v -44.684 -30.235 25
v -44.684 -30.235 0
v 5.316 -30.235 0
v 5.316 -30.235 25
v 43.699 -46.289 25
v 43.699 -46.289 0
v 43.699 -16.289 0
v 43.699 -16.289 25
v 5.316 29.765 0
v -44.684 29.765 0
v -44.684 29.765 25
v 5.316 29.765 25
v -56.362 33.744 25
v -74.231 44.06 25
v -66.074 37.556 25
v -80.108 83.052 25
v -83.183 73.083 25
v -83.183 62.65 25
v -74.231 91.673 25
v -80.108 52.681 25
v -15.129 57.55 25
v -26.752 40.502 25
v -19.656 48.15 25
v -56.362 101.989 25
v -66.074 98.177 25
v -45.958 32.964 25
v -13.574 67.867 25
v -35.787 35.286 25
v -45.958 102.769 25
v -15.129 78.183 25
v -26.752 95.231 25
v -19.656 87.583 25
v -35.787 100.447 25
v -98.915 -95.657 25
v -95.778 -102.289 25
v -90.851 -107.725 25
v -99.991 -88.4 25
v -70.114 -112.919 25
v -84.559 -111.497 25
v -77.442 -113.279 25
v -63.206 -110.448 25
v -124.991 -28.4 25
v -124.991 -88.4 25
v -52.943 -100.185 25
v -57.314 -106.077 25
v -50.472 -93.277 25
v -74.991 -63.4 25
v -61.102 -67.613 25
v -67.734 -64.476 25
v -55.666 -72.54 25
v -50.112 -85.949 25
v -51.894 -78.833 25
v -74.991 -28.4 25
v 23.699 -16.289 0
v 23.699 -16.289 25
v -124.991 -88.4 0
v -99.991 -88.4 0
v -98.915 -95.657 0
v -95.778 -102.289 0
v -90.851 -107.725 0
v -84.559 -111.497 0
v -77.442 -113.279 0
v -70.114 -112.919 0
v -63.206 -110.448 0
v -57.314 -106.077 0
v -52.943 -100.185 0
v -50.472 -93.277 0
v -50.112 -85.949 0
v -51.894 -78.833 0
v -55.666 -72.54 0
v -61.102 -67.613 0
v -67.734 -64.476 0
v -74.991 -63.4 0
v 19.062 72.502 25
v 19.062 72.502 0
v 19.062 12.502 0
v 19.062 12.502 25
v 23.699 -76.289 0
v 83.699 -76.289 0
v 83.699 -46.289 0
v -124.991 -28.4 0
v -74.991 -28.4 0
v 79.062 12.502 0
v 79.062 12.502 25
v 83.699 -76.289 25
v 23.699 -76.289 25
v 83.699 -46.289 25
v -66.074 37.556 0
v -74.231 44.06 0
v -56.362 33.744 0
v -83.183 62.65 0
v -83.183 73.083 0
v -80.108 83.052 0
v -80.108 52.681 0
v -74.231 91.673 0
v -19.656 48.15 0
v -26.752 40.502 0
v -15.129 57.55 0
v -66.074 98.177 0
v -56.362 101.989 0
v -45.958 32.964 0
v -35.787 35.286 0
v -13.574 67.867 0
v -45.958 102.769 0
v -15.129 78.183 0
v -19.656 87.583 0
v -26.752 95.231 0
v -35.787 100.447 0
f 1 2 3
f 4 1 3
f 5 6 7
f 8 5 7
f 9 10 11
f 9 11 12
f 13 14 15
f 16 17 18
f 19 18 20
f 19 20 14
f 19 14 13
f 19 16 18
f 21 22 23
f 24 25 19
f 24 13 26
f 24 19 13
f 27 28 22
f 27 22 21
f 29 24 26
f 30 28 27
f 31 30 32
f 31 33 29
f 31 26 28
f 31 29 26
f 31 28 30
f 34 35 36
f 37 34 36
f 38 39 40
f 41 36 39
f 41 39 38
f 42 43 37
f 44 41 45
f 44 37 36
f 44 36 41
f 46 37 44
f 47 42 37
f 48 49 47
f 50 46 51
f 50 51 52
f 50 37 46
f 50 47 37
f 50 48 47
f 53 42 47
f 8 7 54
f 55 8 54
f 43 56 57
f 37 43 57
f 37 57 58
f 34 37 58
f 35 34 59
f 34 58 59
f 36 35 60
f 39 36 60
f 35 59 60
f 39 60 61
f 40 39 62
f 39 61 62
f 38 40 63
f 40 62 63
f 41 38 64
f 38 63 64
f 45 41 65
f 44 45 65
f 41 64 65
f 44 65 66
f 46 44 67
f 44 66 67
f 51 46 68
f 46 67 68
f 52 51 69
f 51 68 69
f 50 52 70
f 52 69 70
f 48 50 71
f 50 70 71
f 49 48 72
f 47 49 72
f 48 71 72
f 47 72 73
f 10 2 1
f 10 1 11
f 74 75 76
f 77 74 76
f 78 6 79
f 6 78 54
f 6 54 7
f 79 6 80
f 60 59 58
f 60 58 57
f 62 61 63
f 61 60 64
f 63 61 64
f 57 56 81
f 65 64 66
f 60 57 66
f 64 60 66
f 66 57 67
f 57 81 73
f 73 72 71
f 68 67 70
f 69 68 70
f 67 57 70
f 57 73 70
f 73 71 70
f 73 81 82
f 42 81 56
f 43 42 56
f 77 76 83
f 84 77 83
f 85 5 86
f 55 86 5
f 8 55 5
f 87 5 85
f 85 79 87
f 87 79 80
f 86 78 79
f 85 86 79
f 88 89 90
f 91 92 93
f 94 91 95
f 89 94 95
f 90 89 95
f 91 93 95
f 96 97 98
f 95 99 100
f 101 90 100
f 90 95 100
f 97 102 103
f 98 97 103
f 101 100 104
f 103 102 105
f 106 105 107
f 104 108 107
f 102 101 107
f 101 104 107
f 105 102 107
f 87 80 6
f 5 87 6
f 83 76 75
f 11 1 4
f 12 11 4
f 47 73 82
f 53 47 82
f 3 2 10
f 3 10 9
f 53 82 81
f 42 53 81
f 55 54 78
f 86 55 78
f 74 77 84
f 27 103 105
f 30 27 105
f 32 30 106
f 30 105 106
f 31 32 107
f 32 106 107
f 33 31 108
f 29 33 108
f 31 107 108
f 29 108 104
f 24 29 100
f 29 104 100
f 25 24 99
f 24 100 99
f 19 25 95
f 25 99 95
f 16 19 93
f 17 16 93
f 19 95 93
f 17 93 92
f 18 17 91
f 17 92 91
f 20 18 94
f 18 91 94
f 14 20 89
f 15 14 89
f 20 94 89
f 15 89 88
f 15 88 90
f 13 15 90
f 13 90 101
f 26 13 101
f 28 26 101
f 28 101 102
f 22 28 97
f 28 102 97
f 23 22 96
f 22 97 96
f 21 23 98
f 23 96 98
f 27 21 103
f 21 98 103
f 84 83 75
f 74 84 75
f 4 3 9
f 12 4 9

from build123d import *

# Parameters (mm, degrees)
F1_R     = 35
F2_DEPTH = 25
F0_W     = 50
F0_H     = 60
F3_DEPTH = 25
F4_DEPTH = 25


with BuildPart() as f2:
    # F1 (on Top) → F2 (new body)
    with BuildSketch(Plane.XY):
        with Locations((-48.574004, 67.866504)):
            Circle(F1_R)
    extrude(amount=F2_DEPTH)

    # F1 (on Top) → F4 (join)
    with BuildSketch(Plane.XY):
        Polygon((79.061727, 12.502253), (19.061727, 72.502253), (19.061727, 12.502253), align=None)
        with Locations((-48.574004, 67.866504)):
            Circle(F1_R)
        Polygon((83.699414, -46.288603), (43.699414, -46.288603), (43.699414, -16.288603), (23.699414, -16.288603), (23.699414, -46.288603), (23.699414, -76.288603), (43.699414, -76.288603), (83.699414, -76.288603), align=None)
        with BuildLine():
            Line((-74.991417, -28.399708), (-124.991417, -28.399708))
            Line((-124.991417, -28.399708), (-124.991417, -88.399708))
            Line((-124.991417, -88.399708), (-99.991417, -88.399708))
            ThreePointArc((-99.991417, -88.399708), (-57.313747, -106.077378), (-74.991417, -63.399708))
            Line((-74.991417, -63.399708), (-74.991417, -28.399708))
        make_face()
    extrude(amount=F4_DEPTH)


with BuildPart() as f3:
    # F0 (on Top) → F3 (new body)
    with BuildSketch(Plane.XY):
        with Locations((-19.684223, -0.234846)):
            Rectangle(F0_W, F0_H)
    extrude(amount=F3_DEPTH)


solid = Compound([f2.part, f3.part])
